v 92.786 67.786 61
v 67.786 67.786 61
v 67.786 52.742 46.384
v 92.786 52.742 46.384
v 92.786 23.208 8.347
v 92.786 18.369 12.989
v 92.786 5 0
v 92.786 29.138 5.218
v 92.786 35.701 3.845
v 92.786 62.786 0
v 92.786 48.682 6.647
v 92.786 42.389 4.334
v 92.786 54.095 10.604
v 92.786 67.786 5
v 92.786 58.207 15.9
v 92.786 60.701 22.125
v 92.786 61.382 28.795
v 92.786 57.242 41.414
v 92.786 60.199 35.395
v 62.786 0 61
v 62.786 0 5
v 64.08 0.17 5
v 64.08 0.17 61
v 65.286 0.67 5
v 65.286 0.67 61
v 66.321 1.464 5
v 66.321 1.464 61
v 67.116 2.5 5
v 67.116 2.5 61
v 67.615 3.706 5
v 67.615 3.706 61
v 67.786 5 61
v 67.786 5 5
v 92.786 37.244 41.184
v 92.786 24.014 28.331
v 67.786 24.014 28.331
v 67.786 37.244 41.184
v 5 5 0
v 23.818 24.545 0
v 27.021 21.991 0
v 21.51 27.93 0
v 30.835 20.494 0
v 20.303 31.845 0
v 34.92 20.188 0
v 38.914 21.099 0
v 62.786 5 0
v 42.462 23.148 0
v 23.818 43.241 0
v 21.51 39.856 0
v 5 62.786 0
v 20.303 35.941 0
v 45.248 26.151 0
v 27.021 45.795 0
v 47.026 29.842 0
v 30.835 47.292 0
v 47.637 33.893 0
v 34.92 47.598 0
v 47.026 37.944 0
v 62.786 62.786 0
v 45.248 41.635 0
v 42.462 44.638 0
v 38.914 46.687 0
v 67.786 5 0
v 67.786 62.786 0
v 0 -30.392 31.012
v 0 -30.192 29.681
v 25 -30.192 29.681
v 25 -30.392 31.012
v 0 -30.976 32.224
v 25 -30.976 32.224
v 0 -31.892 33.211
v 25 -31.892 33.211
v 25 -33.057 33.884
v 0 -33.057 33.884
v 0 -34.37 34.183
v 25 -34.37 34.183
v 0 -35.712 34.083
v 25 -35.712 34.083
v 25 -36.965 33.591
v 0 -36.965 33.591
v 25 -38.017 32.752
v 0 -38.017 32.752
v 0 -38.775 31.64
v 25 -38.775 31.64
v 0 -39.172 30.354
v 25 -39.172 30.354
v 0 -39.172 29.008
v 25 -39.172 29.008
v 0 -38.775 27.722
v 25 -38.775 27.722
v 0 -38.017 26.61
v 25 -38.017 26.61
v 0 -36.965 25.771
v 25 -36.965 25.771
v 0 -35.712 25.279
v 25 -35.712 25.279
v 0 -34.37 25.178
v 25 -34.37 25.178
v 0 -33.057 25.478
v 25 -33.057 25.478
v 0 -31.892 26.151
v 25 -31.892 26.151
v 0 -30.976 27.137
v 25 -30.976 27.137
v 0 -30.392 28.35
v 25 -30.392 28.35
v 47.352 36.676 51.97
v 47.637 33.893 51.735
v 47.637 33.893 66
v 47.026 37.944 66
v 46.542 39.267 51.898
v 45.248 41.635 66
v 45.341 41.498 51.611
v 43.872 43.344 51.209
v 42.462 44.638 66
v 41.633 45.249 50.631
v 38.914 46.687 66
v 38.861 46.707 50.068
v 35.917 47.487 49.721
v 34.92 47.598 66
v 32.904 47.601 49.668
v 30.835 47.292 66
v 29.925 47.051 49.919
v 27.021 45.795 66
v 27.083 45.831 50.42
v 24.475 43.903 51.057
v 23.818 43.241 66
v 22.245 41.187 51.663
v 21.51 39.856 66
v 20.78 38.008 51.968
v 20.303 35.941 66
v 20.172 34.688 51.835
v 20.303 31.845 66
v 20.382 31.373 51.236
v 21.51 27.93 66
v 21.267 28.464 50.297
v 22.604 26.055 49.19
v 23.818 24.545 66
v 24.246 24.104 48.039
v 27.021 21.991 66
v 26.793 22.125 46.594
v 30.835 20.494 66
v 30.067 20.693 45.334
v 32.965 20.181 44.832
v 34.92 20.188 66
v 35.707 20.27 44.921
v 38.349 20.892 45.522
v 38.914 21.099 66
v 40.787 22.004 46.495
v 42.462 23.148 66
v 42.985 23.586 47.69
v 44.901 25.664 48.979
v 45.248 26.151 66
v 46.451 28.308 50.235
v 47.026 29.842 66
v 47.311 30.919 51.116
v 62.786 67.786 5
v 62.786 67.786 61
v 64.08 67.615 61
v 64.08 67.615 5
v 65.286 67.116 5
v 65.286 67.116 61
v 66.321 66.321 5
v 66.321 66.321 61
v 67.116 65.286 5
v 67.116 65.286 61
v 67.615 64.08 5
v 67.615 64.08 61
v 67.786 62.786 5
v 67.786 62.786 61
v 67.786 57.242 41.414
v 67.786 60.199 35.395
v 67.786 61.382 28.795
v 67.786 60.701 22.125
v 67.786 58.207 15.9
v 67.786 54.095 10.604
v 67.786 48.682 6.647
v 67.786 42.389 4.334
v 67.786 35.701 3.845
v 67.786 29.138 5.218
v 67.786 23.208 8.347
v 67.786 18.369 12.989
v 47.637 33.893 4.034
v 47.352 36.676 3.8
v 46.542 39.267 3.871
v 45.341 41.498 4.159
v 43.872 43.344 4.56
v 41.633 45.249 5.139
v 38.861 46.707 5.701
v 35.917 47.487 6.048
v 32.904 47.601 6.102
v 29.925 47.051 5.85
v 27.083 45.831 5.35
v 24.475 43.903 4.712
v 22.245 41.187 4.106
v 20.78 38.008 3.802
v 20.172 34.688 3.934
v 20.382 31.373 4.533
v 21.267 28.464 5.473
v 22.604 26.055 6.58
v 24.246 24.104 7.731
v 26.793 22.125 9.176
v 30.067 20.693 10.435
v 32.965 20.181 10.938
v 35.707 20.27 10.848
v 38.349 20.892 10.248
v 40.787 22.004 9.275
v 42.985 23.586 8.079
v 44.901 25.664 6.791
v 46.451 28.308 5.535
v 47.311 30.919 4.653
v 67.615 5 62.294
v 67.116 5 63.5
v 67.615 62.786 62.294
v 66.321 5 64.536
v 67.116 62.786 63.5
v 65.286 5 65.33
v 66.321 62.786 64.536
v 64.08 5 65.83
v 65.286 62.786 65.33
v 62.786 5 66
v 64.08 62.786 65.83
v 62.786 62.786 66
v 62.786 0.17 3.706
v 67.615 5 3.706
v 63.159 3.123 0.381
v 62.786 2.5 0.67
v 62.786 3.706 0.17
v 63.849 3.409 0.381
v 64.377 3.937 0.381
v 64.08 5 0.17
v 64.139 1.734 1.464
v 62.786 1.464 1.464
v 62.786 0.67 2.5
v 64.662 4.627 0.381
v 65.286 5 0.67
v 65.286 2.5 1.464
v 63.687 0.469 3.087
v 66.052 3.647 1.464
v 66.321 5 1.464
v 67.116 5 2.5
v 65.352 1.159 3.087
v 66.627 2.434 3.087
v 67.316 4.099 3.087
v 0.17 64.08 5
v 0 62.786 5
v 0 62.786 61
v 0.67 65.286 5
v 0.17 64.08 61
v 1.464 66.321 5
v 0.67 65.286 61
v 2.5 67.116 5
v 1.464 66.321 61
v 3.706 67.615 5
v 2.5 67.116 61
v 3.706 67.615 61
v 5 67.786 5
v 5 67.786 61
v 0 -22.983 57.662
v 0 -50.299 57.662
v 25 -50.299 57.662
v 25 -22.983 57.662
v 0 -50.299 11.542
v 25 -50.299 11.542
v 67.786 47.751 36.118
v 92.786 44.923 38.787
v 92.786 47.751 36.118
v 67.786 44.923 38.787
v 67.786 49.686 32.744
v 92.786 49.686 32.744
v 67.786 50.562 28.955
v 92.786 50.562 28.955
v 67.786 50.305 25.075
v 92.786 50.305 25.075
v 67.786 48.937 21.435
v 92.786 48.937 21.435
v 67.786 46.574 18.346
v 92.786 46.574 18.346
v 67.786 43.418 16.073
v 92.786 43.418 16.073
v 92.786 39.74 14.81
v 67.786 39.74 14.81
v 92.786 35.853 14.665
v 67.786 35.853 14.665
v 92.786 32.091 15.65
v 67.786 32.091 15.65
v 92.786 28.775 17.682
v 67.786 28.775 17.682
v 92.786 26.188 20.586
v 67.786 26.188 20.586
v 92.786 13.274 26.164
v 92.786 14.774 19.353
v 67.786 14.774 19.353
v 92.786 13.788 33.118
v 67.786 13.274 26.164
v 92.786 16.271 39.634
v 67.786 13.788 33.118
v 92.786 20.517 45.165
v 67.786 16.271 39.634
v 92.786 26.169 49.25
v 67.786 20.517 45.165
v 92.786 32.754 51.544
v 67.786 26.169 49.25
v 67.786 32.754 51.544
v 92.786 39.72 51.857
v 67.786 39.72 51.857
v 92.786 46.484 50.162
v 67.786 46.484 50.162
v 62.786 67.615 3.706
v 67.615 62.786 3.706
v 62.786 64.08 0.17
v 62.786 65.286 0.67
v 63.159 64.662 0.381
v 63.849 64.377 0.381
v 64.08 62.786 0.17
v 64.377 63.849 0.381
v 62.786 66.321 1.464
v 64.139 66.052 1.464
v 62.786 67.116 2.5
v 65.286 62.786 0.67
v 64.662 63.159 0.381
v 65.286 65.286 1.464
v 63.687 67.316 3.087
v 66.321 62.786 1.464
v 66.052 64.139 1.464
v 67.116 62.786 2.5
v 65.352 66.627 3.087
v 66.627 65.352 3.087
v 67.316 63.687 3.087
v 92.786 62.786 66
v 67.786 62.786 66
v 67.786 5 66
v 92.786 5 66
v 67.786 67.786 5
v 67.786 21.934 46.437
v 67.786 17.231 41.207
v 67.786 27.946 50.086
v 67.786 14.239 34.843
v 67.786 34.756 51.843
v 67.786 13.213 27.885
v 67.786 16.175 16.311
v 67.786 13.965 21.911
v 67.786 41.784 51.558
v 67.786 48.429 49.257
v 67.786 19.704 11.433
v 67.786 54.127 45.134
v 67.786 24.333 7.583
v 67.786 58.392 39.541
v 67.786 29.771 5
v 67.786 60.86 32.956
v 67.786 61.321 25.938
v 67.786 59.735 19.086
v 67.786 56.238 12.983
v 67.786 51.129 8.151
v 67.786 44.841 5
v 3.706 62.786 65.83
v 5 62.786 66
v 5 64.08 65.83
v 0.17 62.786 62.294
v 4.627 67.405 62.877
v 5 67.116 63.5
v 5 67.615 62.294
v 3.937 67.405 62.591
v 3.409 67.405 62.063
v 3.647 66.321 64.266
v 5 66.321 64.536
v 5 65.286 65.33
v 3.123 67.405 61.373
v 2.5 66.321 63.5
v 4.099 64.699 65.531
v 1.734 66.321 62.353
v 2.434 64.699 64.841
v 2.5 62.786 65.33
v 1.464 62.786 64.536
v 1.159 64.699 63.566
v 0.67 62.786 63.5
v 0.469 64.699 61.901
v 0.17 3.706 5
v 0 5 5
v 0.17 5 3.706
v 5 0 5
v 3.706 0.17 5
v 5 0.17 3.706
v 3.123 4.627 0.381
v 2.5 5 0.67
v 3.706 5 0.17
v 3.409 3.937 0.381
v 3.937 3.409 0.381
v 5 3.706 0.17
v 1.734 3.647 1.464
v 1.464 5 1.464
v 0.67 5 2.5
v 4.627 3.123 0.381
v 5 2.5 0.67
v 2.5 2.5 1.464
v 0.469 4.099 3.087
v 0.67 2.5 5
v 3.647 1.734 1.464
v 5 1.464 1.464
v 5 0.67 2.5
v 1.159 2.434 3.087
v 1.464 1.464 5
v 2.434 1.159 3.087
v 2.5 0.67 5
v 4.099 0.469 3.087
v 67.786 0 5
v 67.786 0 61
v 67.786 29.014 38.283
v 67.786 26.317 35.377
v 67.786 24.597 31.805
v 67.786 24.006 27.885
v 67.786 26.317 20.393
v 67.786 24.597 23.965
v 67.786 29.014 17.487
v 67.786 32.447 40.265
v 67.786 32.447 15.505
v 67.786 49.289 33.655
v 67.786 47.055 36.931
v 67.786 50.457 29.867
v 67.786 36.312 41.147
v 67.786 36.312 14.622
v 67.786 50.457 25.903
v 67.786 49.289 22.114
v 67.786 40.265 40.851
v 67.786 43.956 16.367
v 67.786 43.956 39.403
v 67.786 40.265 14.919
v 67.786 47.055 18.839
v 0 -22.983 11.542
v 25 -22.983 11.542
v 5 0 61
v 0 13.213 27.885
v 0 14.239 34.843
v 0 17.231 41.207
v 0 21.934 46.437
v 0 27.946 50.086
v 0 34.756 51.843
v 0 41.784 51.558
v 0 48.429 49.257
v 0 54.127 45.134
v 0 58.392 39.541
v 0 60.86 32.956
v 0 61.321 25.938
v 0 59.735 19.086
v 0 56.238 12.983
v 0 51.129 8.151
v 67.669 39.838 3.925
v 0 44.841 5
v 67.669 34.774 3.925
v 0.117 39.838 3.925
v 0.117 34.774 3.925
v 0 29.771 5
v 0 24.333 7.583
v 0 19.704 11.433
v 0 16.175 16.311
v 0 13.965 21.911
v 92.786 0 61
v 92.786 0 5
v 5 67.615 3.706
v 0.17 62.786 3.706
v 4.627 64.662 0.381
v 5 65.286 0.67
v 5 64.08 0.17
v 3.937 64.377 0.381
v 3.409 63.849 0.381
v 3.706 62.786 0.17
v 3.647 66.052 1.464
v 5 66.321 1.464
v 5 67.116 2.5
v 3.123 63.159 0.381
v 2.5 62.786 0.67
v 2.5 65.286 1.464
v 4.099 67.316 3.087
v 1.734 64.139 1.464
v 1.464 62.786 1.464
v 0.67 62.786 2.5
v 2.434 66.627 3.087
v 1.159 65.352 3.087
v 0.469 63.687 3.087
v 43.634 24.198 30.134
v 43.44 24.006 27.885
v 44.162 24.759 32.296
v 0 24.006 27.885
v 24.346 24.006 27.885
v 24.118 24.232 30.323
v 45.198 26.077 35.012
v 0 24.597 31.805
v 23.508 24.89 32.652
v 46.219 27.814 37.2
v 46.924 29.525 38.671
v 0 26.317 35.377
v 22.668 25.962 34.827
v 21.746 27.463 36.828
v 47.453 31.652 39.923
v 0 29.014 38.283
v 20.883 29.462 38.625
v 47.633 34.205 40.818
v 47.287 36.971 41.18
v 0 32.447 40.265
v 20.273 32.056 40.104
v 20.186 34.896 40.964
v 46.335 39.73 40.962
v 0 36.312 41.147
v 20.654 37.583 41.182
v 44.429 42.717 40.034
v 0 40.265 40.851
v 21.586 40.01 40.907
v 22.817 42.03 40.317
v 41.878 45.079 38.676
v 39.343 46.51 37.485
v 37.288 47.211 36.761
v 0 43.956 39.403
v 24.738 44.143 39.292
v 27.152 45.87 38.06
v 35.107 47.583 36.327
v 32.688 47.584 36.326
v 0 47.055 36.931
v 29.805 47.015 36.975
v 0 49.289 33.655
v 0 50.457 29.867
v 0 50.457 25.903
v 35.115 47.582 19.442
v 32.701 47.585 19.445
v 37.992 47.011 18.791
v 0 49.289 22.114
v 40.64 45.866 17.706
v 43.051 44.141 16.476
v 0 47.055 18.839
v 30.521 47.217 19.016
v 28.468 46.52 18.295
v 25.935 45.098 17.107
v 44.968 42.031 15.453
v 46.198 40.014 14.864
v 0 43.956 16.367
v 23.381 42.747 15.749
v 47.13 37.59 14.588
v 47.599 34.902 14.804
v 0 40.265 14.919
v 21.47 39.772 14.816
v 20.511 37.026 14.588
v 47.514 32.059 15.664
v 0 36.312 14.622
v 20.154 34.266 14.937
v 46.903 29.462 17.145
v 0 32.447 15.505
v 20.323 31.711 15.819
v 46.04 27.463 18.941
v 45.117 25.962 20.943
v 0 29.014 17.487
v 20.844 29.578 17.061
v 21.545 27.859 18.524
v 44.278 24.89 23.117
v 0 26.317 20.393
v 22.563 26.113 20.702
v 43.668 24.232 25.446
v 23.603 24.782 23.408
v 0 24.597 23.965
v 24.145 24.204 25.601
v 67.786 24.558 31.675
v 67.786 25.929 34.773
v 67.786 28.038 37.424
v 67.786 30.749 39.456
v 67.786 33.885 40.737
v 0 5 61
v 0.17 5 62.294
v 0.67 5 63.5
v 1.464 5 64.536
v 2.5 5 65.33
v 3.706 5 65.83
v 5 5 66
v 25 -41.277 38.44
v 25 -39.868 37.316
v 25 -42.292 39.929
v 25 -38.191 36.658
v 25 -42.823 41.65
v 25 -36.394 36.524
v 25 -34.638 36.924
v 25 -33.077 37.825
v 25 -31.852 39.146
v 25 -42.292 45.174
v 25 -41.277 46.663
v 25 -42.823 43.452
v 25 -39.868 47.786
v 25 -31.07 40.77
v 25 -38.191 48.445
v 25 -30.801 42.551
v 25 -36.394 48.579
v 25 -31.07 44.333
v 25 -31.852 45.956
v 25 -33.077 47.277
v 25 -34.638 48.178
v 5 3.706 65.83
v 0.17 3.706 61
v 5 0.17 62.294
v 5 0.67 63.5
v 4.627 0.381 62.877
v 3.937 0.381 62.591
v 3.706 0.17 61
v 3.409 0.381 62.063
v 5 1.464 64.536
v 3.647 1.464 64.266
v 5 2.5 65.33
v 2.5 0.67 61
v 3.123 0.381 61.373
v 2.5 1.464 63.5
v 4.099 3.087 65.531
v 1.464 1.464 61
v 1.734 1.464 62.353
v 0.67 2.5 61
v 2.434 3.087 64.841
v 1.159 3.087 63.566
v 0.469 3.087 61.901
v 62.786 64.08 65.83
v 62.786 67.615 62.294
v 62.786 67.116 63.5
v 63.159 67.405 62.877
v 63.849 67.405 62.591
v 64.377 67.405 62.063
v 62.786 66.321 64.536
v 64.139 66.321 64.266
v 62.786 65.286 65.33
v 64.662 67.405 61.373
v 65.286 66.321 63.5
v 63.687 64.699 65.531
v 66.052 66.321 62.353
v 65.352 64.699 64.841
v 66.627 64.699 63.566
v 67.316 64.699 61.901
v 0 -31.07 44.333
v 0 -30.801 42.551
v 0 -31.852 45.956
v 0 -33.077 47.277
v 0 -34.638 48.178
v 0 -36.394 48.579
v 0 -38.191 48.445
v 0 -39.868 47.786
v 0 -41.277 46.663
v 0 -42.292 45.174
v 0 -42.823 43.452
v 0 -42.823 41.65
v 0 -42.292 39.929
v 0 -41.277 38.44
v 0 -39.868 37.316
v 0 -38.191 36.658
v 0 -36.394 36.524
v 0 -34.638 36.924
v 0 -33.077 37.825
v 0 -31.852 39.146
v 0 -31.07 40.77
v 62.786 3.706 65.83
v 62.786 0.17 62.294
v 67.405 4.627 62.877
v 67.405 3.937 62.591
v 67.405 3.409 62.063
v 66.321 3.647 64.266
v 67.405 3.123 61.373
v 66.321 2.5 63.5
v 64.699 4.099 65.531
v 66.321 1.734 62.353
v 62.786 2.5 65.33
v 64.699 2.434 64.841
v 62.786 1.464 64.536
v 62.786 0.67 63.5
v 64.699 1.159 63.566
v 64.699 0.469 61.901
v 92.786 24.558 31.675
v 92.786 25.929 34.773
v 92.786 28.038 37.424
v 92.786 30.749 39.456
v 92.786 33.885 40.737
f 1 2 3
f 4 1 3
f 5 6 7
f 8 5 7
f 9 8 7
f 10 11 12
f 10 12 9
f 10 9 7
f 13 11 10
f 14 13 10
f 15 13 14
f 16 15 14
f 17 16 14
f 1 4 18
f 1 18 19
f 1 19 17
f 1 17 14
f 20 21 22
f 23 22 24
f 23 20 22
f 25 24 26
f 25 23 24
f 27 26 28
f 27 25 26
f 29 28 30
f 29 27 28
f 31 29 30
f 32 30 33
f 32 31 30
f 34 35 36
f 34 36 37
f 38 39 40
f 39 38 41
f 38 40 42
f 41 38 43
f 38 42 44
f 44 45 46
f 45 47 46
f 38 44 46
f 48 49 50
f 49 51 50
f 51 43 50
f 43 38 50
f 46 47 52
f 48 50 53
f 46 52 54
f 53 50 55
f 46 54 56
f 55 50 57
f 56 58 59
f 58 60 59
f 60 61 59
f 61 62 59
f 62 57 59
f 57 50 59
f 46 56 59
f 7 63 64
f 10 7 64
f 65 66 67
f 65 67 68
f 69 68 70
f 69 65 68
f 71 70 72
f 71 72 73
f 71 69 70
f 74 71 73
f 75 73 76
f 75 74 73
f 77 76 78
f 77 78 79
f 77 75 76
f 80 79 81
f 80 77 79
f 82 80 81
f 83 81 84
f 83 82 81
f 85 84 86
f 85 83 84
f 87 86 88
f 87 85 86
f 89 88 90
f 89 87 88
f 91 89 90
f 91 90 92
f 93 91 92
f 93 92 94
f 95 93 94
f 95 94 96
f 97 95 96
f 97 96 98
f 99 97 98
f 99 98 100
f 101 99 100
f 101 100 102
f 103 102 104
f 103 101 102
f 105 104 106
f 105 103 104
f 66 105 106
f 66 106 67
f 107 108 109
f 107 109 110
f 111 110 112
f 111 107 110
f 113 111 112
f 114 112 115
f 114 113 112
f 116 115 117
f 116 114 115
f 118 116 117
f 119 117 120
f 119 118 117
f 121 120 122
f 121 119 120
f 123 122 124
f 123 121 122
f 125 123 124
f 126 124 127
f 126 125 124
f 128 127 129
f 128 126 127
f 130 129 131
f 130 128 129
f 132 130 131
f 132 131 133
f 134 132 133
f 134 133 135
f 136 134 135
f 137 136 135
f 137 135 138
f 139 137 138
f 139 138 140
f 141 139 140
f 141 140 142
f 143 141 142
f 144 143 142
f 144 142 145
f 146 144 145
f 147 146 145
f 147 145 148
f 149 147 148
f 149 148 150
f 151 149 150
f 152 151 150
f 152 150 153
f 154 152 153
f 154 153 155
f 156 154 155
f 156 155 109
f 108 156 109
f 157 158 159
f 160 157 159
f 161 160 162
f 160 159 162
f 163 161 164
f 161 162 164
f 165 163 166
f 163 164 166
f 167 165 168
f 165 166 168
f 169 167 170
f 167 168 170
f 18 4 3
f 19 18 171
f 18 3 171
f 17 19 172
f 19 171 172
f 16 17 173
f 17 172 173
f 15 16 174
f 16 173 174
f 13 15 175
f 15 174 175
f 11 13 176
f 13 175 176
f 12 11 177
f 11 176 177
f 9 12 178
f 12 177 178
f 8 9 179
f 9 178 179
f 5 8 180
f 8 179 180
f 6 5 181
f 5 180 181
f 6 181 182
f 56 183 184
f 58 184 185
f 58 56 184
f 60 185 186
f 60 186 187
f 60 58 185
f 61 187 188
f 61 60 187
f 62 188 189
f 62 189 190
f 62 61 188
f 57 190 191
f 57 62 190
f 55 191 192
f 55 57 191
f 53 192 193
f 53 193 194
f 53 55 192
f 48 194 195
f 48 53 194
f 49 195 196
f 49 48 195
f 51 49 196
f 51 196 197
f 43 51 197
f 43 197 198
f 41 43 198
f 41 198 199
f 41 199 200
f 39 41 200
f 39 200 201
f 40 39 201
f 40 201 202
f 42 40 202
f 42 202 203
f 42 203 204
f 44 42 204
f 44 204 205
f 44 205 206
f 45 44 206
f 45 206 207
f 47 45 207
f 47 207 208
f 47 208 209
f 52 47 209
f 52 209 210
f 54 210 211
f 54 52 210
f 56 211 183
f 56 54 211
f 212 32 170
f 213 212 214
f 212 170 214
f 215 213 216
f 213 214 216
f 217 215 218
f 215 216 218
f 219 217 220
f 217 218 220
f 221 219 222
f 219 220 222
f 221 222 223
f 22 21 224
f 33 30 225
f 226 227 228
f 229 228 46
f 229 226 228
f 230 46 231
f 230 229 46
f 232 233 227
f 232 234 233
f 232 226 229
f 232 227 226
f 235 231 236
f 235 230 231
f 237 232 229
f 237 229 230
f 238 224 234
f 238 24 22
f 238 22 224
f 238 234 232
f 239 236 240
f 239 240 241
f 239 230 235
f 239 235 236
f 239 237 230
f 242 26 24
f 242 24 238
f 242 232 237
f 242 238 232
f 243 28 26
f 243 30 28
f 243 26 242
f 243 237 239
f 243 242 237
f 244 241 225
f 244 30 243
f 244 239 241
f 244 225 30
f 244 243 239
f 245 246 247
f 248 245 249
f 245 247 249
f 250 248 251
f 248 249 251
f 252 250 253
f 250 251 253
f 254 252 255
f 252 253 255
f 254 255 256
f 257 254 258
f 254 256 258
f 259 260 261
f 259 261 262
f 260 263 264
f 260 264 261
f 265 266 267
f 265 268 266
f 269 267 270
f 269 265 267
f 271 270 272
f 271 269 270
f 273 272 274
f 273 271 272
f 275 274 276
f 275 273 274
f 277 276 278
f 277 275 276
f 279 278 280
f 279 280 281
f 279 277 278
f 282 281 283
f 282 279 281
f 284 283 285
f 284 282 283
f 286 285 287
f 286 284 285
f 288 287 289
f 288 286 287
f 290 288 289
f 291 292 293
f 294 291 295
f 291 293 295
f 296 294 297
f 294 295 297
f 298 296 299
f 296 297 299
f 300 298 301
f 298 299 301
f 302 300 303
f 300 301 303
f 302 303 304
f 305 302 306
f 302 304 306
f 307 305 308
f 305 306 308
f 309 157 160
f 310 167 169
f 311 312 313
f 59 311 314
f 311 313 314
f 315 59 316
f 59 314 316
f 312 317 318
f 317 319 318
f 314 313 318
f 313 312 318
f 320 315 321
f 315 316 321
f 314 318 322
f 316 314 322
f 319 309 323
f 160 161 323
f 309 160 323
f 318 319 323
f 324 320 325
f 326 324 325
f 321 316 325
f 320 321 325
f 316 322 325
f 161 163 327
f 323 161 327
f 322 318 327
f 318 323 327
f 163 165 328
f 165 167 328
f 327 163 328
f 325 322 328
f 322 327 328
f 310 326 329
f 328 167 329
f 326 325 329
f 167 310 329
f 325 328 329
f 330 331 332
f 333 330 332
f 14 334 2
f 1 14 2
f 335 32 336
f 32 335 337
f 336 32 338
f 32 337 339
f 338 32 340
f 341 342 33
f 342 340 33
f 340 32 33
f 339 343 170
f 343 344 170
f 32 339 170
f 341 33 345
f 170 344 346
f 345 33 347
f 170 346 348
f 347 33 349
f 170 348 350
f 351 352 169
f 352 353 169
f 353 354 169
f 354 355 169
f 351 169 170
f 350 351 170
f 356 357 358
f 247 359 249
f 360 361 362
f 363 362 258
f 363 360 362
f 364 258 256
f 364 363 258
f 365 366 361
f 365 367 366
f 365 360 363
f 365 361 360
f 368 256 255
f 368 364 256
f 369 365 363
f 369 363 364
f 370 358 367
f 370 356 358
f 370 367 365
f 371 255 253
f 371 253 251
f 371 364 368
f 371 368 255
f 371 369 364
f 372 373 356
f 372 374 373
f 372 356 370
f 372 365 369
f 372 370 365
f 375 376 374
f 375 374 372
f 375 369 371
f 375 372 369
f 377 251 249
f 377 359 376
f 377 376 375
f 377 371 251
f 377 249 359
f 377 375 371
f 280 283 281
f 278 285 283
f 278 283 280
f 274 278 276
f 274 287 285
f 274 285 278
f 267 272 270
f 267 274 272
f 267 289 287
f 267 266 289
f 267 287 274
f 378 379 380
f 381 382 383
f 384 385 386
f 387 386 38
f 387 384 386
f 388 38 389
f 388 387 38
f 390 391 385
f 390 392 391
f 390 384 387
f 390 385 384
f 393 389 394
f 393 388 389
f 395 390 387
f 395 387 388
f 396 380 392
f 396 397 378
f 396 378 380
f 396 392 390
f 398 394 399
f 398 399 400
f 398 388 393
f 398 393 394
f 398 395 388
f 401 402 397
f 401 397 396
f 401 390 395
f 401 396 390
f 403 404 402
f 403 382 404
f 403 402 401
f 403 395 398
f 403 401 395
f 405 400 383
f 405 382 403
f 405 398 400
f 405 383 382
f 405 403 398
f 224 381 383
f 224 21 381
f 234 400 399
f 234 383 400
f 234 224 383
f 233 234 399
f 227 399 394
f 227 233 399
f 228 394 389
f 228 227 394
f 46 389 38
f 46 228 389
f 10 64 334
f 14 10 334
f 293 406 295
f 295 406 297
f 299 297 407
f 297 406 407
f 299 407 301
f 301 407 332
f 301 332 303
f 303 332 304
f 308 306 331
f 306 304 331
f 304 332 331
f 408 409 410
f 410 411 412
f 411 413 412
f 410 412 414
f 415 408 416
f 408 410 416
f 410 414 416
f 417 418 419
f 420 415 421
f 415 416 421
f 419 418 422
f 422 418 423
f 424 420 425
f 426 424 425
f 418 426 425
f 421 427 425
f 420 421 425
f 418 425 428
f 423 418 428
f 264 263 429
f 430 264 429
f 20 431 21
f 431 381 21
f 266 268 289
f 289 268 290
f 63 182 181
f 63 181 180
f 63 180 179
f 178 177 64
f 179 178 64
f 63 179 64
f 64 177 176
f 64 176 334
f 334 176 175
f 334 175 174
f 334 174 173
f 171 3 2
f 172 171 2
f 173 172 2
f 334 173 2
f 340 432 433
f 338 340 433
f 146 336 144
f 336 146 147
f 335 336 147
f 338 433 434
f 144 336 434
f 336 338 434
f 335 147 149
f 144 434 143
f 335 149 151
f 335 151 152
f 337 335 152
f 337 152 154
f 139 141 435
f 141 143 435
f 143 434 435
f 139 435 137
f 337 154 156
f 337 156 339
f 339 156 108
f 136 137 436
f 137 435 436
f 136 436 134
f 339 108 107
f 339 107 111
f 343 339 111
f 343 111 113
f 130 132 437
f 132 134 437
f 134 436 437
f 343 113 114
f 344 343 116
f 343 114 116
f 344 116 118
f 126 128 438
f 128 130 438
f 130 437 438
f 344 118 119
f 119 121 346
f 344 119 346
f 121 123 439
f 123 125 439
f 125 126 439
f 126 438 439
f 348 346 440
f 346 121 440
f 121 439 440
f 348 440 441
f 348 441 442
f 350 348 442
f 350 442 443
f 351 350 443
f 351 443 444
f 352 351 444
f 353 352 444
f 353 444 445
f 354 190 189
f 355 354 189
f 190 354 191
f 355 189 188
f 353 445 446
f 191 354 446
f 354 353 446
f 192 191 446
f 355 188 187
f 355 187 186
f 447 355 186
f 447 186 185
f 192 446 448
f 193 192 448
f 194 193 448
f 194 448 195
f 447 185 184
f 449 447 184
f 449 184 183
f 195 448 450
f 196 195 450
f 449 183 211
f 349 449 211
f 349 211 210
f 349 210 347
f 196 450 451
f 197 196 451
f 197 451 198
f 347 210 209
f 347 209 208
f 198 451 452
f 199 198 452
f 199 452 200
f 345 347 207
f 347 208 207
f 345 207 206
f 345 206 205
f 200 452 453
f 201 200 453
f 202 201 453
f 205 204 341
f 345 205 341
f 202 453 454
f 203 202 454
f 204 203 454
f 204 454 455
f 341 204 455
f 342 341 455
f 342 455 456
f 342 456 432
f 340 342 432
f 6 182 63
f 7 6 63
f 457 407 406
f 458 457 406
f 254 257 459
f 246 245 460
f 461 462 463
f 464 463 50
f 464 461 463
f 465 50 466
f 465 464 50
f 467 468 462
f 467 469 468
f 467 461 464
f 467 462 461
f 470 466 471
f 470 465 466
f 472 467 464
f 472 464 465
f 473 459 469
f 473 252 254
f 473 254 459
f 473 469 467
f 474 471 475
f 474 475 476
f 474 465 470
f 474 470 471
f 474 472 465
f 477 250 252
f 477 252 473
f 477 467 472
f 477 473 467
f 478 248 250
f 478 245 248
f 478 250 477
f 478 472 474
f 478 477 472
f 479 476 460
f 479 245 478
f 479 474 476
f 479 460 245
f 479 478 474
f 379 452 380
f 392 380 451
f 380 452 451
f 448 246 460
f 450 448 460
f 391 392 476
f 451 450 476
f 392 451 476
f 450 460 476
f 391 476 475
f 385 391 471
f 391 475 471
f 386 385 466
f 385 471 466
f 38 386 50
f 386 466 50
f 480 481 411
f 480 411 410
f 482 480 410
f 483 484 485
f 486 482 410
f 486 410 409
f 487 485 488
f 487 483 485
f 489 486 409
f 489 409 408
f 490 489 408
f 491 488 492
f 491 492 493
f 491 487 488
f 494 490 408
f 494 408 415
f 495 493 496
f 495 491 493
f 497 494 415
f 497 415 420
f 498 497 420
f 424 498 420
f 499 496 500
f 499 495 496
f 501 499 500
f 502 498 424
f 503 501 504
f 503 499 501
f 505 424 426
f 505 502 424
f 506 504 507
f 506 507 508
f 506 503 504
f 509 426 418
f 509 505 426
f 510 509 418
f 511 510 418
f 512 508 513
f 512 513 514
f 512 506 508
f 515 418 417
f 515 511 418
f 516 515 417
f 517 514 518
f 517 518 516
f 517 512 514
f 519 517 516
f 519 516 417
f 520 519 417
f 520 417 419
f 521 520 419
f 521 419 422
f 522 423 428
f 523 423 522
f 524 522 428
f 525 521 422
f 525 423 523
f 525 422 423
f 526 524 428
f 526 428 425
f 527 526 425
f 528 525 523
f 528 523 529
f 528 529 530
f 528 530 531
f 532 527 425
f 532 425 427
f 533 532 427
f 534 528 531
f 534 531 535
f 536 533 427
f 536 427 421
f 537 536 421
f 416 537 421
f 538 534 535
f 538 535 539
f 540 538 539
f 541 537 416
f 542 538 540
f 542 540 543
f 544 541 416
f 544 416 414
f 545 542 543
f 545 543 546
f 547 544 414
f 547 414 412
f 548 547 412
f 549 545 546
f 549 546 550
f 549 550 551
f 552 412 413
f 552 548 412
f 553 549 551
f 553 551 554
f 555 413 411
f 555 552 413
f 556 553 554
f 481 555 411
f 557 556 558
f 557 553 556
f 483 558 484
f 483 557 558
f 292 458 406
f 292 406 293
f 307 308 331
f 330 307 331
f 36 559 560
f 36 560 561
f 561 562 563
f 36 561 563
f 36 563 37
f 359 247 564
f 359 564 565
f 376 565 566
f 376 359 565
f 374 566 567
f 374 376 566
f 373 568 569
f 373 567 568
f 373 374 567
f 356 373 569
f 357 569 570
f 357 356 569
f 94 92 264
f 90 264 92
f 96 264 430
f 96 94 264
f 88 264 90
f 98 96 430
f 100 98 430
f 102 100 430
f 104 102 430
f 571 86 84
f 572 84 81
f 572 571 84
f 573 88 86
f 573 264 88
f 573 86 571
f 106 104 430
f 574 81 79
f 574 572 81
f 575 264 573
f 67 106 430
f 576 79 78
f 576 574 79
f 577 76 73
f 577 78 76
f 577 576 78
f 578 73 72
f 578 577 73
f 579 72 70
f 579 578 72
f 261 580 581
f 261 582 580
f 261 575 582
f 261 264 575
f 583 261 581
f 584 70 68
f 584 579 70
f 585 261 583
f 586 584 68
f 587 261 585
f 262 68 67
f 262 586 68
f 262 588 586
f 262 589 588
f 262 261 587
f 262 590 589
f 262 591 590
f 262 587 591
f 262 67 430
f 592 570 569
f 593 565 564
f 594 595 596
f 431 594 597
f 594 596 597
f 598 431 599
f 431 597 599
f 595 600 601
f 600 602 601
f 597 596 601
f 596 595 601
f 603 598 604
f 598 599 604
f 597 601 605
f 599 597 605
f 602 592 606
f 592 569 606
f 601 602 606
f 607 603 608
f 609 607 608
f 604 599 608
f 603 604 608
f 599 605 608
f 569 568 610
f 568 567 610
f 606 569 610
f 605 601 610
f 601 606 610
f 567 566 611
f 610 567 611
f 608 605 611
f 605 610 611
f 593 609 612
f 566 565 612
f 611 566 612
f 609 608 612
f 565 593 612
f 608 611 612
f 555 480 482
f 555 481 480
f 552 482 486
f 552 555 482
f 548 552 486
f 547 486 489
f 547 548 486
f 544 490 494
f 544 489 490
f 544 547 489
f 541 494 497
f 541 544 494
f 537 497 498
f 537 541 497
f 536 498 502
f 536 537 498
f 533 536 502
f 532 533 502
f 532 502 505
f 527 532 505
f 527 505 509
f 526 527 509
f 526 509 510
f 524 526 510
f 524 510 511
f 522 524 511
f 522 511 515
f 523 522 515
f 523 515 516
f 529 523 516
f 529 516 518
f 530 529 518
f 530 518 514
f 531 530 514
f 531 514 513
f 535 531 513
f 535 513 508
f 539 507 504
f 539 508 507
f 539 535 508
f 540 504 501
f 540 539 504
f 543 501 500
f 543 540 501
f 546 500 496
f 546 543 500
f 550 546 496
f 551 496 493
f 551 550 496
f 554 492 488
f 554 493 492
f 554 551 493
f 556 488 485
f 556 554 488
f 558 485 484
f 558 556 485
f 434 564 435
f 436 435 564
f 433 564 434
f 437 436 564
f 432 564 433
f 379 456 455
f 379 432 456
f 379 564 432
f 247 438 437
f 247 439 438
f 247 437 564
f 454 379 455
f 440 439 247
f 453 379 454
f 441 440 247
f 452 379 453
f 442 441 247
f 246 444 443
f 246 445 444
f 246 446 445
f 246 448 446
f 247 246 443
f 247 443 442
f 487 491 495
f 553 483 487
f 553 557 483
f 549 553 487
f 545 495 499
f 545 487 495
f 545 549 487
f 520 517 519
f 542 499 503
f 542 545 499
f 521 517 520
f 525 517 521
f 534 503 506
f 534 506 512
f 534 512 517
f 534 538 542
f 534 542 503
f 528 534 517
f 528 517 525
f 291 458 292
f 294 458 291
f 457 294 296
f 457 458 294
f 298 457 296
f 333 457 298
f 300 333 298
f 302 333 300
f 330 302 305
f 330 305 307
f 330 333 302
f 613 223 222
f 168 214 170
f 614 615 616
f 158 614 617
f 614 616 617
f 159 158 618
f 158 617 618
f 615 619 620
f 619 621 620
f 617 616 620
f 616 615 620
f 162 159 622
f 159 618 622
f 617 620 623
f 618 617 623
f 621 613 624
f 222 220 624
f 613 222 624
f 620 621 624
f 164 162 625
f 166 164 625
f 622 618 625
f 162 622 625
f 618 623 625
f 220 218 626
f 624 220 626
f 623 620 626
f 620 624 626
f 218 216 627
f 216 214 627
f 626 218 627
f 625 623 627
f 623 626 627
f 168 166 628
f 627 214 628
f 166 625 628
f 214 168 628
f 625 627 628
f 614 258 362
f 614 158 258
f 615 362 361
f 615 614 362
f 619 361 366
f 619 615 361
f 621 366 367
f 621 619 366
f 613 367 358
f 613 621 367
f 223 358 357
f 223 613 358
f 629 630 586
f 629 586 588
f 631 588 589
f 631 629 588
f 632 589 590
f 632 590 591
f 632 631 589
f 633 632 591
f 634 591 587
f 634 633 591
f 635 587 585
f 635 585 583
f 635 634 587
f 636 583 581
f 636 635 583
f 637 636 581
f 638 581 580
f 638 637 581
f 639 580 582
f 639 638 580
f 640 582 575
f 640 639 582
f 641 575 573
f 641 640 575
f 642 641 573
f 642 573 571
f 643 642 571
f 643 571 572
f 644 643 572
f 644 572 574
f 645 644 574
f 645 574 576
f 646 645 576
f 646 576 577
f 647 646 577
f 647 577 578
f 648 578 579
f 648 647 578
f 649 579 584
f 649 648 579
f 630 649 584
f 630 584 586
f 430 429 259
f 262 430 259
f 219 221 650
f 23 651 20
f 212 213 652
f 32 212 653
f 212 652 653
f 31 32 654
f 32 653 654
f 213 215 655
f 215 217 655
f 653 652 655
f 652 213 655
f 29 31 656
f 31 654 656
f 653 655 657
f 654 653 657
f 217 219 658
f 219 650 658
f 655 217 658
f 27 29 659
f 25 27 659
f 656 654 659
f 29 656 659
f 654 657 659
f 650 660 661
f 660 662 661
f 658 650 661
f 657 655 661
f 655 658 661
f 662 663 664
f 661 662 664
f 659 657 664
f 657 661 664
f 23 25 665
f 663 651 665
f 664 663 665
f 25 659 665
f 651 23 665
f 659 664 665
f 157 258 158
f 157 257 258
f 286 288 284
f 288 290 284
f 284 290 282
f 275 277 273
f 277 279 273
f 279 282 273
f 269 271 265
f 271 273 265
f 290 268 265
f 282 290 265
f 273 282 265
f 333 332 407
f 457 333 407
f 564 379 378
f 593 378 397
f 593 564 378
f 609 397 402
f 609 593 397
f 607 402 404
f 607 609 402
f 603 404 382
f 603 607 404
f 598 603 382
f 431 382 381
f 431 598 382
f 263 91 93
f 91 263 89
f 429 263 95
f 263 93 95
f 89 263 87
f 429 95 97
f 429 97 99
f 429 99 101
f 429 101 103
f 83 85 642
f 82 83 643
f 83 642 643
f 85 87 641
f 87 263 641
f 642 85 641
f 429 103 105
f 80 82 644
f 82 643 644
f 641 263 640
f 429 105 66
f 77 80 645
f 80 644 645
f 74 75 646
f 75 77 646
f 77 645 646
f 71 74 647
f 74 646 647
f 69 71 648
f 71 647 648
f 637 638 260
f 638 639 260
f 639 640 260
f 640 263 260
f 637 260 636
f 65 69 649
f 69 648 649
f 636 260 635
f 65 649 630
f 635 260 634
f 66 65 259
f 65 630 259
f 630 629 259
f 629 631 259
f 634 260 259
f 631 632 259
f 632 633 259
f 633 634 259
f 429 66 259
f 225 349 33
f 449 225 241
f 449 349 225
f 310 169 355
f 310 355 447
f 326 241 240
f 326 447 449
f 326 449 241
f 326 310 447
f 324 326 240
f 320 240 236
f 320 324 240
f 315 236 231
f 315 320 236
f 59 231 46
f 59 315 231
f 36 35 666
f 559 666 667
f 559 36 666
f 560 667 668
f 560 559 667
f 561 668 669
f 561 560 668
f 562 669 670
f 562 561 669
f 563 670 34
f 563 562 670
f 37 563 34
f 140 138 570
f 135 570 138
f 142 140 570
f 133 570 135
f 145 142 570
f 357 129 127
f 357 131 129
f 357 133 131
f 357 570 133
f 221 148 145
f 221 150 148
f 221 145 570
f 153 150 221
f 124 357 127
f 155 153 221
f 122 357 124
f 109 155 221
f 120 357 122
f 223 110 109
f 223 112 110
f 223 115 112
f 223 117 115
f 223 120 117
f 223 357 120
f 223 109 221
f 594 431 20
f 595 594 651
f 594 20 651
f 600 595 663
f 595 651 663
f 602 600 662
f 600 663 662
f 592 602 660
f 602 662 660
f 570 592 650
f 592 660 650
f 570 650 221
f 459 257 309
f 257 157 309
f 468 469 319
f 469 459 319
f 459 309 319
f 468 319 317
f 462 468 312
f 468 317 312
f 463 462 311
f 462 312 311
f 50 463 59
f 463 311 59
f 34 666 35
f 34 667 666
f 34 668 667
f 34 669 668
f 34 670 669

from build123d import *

# Parameters (mm, degrees)
F0_W          = 67.785792
F0_H          = 67.785792
F0_R          = 13.743659
F1_DEPTH      = 66
F2_R          = 5
F4_DEPTH      = 25
F5_R          = 24.093319
F5_R_2        = 13.299595
F6_DEPTH      = 25
F6_DEPTH_BACK = 92.785792
F8_W          = 27.31685
F8_H          = 46.120874
F8_R          = 4.515181
F8_R_2        = 6.044736
F9_DEPTH      = 25


with BuildPart() as f1:
    # F0 (on Top) → F1 (new body)
    with BuildSketch(Plane.XY):
        with Locations((33.892896, 33.892896)):
            Rectangle(F0_W, F0_H)
        with Locations((33.892896, 33.892896)):
            Circle(F0_R, mode=Mode.SUBTRACT)
    extrude(amount=F1_DEPTH)

    # F2
    f2_edges = [f1.edges().sort_by_distance(p)[0] for p in [
        (0, 33.892896, 66),
        (33.892896, 0, 66),
        (67.785792, 33.892896, 66),
        (33.892896, 67.785792, 66),
        (67.785792, 67.785792, 33),
        (67.785792, 0, 33),
        (0, 0, 33),
        (0, 67.785792, 33),
        (33.892896, 67.785792, 0),
        (0, 33.892896, 0),
        (33.892896, 0, 0),
        (67.785792, 33.892896, 0),
    ]]
    fillet(f2_edges, radius=F2_R)


with BuildPart() as f4:
    # F3 (on face) → F4 (new body)
    with BuildSketch(Plane.YZ.offset(67.785792)):
        Polygon((67.785792, 5), (67.785792, 61), (5, 0), (62.785792, 0), align=None)
        Polygon((62.785792, 66), (5, 66), (0, 61), (0, 5), align=None)
    extrude(amount=F4_DEPTH)


with BuildPart() as f6:
    # F5 (on face) → F6 (new body, two sides)
    with BuildSketch(Plane(origin=(0, 0, 0), x_dir=(0, -1, 0), z_dir=(-1, 0, 0))) as f6_sk:
        with Locations((-37.306011, 27.884785)):
            Circle(F5_R)
        with Locations((-37.306011, 27.884785)):
            Circle(F5_R_2, mode=Mode.SUBTRACT)
    extrude(amount=F6_DEPTH)
    extrude(f6_sk.sketch, amount=-F6_DEPTH_BACK)


with BuildPart() as f4_1:
    add(f4.part)

    # F7: cut F6
    add(f6.part, mode=Mode.SUBTRACT)


with BuildPart() as f1_1:
    add(f1.part)

    # F7: cut F6
    add(f6.part, mode=Mode.SUBTRACT)


with BuildPart() as f9:
    # F8 (on Right) → F9 (new body)
    with BuildSketch(Plane.YZ):
        with Locations((-36.640974, 34.602002)):
            Rectangle(F8_W, F8_H)
        with Locations((-34.706943, 29.680837)):
            Circle(F8_R, mode=Mode.SUBTRACT)
        with Locations((-36.846131, 42.55135)):
            Circle(F8_R_2, mode=Mode.SUBTRACT)
    extrude(amount=F9_DEPTH)


solid = Compound([f4_1.part, f1_1.part, f9.part])
